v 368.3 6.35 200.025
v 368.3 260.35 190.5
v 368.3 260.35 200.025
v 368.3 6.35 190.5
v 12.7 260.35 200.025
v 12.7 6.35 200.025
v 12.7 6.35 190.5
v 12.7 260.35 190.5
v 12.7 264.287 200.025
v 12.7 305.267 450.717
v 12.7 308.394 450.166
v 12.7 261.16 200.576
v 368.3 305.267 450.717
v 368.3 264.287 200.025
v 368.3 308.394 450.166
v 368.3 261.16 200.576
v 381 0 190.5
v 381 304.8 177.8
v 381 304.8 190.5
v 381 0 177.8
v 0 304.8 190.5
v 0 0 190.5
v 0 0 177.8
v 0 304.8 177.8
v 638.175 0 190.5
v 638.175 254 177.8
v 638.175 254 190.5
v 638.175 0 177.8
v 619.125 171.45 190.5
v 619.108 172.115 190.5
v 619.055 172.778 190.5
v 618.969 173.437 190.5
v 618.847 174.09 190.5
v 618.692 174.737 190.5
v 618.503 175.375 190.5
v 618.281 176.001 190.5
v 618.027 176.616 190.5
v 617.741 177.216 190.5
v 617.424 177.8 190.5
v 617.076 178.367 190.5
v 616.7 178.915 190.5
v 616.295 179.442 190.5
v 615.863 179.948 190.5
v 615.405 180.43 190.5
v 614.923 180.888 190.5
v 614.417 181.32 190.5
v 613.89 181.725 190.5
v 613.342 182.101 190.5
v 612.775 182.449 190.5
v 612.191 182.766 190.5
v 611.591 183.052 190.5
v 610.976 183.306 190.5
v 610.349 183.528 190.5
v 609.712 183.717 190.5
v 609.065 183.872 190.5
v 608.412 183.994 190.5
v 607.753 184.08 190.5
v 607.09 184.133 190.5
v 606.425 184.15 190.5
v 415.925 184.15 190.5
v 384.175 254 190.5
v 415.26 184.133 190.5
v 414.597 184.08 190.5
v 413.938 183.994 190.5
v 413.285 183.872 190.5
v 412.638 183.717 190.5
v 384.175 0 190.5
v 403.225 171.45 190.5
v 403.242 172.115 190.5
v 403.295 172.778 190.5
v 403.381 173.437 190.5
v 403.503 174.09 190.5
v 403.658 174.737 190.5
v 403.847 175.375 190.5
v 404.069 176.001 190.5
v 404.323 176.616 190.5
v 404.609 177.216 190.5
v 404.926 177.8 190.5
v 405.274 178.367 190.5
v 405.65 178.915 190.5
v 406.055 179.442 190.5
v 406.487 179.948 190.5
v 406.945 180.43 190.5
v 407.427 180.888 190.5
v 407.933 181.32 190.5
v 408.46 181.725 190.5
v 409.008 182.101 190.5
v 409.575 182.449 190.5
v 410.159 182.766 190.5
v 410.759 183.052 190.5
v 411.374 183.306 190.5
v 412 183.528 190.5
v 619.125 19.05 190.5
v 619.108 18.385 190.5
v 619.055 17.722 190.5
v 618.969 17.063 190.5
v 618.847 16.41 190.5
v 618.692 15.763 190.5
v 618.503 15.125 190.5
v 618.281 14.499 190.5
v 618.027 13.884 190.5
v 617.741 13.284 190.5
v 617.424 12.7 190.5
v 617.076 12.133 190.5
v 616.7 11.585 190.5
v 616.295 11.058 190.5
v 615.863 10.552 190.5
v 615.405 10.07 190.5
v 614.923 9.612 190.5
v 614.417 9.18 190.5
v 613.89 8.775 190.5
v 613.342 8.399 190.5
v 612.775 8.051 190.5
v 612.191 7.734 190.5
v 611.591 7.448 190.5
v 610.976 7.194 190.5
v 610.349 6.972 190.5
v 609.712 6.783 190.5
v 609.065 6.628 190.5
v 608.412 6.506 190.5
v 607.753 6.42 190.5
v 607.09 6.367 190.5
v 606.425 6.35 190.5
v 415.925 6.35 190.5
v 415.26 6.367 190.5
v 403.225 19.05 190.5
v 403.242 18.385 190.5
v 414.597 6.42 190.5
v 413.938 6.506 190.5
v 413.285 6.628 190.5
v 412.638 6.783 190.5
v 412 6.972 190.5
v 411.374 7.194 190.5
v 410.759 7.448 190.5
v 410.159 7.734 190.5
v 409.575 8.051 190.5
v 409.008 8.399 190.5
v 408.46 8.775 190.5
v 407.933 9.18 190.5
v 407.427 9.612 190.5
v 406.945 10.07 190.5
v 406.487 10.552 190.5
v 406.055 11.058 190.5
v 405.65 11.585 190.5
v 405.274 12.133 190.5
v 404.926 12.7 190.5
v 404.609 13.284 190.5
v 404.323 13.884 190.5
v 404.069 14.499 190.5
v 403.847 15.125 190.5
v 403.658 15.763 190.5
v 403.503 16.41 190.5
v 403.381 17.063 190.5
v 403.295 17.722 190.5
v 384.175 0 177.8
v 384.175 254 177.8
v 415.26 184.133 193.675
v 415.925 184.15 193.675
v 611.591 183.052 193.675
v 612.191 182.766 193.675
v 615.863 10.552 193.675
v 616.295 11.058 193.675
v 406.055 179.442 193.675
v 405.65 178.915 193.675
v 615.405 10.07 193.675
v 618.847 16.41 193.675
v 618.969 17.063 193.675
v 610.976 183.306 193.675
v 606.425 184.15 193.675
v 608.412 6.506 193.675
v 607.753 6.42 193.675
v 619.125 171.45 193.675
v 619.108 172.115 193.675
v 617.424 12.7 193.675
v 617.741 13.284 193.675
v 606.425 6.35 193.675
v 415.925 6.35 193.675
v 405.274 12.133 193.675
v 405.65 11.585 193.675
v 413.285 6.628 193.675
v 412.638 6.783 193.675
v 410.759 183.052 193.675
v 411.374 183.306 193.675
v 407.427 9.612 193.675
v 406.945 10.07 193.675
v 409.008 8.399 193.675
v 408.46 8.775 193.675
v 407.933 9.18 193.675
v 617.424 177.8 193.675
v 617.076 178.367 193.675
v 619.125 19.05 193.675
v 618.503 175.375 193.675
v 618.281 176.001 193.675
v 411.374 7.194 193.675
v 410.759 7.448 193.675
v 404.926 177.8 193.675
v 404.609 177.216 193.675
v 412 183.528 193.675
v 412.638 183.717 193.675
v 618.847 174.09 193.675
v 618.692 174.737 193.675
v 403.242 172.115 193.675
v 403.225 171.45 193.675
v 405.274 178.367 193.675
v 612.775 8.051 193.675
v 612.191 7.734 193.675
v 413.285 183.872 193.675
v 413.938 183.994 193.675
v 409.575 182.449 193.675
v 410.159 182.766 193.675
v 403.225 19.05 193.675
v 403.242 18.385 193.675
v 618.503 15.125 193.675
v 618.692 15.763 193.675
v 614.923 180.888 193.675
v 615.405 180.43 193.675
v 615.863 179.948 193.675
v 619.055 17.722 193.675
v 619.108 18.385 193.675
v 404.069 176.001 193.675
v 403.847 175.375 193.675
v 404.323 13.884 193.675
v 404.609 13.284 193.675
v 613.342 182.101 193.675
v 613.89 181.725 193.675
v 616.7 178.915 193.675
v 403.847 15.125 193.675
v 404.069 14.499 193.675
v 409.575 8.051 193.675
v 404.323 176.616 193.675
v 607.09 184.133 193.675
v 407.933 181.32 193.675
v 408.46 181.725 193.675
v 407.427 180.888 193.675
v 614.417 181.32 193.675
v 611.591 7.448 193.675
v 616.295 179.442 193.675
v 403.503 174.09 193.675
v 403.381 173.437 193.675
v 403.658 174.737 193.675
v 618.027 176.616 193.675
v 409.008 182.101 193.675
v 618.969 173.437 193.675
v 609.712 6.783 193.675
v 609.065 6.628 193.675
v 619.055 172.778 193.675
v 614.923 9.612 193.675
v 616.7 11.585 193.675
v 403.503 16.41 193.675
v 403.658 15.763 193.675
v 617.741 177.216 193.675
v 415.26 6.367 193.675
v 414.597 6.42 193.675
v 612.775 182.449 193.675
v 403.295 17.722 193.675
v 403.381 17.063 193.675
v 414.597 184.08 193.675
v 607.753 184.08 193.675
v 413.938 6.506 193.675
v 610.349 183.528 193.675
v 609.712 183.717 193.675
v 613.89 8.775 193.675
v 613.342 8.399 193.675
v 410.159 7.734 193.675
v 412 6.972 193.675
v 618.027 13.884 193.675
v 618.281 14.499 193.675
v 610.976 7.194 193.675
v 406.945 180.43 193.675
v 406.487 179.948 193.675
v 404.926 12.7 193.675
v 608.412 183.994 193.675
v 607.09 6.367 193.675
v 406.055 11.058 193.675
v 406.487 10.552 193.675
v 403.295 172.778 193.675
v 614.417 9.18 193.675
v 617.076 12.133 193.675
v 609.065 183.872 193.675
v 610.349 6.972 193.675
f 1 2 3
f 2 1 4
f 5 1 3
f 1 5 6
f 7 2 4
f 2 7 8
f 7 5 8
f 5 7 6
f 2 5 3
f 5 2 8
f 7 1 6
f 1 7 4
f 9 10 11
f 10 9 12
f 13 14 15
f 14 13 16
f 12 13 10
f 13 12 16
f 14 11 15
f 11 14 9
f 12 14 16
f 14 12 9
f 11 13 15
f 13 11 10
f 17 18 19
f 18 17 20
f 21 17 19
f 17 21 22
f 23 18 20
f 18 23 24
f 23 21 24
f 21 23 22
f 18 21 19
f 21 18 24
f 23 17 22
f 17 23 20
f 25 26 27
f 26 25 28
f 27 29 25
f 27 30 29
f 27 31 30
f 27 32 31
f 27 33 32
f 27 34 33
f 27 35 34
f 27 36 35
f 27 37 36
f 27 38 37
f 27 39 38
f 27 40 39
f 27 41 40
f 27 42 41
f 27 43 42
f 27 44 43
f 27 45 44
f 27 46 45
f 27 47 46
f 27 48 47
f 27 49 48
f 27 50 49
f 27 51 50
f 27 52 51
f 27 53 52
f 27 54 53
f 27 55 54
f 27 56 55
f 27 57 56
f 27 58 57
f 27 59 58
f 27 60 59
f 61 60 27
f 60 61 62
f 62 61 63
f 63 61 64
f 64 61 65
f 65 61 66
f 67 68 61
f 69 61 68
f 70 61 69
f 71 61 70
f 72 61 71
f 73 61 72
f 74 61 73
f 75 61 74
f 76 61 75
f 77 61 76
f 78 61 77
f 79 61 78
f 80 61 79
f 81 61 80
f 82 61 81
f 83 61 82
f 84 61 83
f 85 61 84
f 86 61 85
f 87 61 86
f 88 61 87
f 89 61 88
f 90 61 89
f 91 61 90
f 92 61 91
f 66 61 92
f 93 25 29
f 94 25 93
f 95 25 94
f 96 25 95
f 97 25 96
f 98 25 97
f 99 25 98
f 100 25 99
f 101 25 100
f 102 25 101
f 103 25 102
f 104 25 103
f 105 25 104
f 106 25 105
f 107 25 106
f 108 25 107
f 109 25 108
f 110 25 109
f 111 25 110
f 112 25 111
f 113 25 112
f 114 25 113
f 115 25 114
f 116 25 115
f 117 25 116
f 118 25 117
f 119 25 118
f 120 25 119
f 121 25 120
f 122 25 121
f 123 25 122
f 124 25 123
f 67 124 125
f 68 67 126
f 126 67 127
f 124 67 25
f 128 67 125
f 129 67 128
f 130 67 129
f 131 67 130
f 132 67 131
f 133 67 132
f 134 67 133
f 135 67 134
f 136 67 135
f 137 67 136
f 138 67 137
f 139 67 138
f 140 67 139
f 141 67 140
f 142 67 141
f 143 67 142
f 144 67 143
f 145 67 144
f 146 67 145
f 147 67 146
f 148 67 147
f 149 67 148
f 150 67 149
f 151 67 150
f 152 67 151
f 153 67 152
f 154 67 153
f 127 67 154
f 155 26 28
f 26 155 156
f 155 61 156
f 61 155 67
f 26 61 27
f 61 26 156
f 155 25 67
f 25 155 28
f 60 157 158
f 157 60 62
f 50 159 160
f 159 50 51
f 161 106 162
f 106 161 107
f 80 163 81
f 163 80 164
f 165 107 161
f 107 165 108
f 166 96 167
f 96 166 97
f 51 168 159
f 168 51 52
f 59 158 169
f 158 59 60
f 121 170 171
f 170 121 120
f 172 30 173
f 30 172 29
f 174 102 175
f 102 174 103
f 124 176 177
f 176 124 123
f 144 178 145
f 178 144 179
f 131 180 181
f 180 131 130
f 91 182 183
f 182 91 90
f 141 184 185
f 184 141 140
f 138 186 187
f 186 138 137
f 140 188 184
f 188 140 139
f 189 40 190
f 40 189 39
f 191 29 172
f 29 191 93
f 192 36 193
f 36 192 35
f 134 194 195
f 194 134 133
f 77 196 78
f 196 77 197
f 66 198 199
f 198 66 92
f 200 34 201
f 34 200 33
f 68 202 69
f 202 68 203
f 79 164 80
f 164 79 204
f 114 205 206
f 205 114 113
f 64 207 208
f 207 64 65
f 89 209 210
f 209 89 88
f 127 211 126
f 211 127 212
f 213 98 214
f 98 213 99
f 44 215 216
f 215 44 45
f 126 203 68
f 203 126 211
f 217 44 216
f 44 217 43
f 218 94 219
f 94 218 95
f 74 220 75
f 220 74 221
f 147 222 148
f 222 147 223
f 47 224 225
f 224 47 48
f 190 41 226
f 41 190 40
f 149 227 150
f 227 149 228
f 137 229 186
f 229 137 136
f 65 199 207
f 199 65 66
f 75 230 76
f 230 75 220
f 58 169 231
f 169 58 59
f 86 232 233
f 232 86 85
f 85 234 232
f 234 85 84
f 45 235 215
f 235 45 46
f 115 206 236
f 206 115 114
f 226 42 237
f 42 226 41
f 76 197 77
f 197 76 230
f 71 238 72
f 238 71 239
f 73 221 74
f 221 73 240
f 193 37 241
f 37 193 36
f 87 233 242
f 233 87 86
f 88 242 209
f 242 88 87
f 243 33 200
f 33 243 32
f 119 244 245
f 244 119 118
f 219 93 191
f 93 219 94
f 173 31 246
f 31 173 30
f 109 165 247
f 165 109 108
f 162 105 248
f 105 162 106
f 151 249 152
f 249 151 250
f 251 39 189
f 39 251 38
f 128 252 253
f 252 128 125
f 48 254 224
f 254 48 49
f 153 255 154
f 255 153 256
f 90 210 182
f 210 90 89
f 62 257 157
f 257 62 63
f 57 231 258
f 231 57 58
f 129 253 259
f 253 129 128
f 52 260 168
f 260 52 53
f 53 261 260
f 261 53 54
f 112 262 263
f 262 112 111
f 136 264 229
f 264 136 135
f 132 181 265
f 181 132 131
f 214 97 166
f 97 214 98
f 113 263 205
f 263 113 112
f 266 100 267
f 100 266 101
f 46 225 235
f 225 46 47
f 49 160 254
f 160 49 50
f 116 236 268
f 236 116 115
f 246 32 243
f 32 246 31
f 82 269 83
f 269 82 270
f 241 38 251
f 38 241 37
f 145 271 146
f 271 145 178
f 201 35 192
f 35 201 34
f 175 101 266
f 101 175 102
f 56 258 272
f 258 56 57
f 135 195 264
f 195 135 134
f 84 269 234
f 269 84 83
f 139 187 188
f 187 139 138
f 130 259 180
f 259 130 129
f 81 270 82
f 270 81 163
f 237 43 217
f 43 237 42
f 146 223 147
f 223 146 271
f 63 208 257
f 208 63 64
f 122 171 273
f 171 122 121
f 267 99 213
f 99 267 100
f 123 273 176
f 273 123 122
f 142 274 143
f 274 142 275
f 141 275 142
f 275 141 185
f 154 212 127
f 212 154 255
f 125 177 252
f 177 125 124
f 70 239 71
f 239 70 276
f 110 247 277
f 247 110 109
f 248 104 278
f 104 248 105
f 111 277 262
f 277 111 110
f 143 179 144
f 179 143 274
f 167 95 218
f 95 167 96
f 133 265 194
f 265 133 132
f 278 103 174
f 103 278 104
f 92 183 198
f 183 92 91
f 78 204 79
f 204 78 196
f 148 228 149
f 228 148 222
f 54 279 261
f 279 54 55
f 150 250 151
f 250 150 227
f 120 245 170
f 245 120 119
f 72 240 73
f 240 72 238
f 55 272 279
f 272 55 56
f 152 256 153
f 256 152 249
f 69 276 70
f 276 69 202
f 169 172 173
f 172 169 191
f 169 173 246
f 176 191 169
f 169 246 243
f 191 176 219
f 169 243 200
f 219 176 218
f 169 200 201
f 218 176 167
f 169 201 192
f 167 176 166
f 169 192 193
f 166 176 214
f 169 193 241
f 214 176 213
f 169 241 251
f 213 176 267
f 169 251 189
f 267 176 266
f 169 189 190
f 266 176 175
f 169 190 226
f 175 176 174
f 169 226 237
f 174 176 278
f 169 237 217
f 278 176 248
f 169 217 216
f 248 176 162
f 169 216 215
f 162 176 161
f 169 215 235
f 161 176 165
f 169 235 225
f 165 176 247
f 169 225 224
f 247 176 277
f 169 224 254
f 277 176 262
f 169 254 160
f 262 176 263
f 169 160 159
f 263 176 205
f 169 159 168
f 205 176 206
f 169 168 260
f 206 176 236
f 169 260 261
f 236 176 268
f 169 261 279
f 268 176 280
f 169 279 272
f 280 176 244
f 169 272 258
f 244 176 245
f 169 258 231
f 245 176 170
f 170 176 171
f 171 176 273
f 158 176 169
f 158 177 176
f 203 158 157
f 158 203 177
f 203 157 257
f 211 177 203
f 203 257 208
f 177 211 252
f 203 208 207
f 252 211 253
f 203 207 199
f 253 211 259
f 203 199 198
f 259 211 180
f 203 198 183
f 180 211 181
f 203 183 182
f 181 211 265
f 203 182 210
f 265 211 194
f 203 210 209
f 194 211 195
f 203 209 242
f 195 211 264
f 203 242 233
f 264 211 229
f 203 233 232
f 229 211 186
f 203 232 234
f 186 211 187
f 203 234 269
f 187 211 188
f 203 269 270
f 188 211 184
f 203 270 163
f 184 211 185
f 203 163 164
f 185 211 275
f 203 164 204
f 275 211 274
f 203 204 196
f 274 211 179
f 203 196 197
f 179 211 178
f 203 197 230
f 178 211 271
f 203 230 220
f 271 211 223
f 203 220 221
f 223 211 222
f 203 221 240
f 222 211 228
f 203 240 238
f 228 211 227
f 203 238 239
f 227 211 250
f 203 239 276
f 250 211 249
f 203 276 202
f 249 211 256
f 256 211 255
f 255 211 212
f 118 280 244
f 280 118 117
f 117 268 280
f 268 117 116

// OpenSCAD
inch=25.4;

module laptop(){
        cube([14*inch,10*inch,0.375*inch]);
    translate([0,10*inch+0.155*inch,0.375*inch])
        rotate([80,0,0])
        cube([14*inch,10*inch,0.125*inch]);
}

module mousepad(){
    translate([0.5*inch,0.5*inch,0])
    minkowski(){
        cube([7.5*inch,6*inch,0.0625*inch]);
        cylinder(0.0625*inch,0.5*inch,0.5*inch,$fn=120);
    }
}


module present(){
    translate([0,0,7*inch]){
        cube([15*inch,12*inch,0.5*inch]);

        translate([15.125*inch,0,0])
        cube([10*inch,10*inch,0.5*inch]);

        translate([15.125*inch,0,0.5*inch])
        translate([0.75*inch,0.25*inch,0])
        mousepad();


        translate([0.5*inch,0.25*inch,0.5*inch])
        laptop();
    }
}

present();
